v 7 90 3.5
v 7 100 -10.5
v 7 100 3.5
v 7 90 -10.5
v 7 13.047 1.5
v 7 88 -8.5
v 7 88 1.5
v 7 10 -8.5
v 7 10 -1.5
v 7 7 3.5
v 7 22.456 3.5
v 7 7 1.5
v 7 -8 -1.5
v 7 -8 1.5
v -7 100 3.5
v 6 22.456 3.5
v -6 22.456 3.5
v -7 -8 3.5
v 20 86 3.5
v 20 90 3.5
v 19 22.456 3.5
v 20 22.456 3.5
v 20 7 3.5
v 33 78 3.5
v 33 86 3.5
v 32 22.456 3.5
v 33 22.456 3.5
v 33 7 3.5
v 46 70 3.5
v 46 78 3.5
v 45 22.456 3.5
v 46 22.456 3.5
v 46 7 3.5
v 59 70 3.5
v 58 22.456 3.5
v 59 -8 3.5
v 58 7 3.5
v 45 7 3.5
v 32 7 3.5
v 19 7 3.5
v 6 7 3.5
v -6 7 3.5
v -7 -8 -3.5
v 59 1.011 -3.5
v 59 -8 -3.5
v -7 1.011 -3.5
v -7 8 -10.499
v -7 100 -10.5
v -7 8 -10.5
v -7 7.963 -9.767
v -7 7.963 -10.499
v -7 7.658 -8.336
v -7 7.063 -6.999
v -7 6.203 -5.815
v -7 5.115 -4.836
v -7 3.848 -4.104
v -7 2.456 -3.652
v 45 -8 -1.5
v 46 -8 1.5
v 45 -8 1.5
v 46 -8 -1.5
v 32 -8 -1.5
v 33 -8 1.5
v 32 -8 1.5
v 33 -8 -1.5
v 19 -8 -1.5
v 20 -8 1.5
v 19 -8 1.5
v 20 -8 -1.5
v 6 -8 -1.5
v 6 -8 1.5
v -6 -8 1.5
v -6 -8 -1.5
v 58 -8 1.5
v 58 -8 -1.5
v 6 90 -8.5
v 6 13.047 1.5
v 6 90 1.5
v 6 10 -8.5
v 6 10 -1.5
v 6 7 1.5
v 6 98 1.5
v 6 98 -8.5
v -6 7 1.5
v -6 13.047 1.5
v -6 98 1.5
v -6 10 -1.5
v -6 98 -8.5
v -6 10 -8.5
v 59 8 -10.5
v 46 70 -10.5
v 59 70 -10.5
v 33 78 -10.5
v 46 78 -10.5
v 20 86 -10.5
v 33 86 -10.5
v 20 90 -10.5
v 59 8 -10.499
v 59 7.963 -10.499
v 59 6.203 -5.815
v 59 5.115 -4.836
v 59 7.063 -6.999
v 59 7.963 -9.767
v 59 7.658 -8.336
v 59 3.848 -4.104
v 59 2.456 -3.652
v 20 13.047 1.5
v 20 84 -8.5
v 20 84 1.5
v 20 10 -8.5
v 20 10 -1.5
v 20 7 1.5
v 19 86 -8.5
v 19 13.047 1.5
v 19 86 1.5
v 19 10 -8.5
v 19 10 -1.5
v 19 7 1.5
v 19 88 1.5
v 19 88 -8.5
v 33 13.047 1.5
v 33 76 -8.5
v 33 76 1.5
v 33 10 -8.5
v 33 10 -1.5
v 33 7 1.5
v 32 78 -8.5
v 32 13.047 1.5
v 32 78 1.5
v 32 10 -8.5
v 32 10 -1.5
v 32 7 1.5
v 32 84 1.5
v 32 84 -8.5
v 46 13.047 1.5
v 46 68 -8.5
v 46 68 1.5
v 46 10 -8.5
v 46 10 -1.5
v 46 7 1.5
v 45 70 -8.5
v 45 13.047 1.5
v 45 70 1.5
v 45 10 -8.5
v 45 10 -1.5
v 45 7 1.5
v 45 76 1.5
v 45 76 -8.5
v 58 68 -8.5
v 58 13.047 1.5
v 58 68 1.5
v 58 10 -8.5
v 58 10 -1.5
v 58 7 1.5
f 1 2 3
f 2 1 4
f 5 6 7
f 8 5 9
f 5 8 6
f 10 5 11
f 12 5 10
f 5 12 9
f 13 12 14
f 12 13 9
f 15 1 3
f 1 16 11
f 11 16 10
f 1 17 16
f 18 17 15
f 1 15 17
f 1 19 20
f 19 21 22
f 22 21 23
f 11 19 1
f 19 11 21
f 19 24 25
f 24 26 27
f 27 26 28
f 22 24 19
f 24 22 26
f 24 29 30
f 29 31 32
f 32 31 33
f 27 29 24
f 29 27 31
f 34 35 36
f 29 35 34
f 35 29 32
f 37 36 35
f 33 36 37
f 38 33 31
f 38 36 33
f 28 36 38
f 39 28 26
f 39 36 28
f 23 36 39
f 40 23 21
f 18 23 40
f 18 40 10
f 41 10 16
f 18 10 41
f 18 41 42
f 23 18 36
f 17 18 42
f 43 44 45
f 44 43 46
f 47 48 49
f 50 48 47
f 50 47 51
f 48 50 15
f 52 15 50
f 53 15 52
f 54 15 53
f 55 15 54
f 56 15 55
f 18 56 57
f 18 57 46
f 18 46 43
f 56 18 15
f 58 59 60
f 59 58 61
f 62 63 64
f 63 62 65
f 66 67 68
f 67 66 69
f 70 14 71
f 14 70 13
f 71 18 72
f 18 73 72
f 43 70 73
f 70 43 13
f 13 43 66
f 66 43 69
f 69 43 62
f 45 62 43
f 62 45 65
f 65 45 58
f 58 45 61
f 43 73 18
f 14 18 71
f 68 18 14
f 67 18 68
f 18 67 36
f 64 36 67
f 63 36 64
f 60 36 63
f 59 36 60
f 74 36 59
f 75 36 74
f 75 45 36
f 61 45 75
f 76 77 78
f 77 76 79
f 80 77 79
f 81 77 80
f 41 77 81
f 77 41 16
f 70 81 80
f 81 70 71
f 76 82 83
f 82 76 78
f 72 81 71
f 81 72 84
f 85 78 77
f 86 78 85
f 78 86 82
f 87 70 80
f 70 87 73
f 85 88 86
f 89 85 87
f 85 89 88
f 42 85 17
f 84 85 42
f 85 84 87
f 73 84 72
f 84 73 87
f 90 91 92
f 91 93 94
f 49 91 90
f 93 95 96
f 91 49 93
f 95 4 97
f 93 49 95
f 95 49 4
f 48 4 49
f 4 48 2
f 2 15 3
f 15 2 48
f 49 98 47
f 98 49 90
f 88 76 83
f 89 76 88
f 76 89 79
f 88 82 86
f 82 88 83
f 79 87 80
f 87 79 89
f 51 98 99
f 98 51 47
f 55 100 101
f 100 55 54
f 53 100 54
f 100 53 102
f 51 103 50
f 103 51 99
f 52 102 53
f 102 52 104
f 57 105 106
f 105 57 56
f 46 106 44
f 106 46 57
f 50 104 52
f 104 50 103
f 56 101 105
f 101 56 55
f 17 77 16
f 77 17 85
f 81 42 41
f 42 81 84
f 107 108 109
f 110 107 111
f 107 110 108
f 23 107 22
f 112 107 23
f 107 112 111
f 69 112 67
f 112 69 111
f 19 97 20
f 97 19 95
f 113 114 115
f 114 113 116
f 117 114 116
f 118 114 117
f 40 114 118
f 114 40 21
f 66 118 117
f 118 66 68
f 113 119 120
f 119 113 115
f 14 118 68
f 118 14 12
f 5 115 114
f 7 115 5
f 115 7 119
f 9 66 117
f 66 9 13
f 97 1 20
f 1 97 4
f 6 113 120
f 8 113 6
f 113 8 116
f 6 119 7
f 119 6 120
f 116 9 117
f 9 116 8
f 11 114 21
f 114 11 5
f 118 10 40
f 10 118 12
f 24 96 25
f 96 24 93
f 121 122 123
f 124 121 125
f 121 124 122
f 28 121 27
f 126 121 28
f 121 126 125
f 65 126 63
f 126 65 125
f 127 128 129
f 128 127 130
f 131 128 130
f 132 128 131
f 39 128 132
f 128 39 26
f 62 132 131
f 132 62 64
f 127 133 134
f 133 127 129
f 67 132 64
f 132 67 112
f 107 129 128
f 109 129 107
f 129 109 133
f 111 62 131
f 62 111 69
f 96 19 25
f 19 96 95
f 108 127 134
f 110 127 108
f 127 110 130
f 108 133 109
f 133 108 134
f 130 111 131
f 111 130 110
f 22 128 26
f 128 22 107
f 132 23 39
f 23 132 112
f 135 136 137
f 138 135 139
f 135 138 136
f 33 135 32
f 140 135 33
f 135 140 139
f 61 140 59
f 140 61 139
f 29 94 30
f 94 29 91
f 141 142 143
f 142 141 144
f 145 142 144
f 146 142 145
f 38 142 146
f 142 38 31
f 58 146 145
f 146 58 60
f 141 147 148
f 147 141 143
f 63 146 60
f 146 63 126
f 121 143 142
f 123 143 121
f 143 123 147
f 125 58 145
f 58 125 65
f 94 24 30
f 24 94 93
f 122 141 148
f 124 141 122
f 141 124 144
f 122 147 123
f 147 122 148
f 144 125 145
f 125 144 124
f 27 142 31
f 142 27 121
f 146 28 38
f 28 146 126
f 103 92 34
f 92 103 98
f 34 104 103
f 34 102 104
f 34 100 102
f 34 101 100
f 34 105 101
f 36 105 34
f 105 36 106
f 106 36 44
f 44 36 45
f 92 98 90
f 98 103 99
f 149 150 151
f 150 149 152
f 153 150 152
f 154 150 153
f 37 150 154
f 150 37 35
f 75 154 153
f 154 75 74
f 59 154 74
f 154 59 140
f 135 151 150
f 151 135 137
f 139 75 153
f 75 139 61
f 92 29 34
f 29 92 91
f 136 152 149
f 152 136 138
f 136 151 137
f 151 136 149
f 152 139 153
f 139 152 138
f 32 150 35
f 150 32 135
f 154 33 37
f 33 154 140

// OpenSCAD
// [FL_INDEX: keywords="openscad, 3d_parametric, Customizer_Multitone_Whistle, csg_solid" | COT="Parametric OpenSCAD design from 3DCodeverse"]
// Title: Customizer Multitone Whistle

windway_width=12/1;
windway_height=3/1;
windway_length=16/1;
sidewall=1/1;
wall=2/1;
extra=1/1;
chamber_height=10/1;
chamber_width=windway_width;

ramp_angle=12/1;
opening_width=6/1;
ramp_length=(wall+extra)/tan(ramp_angle);

length_for_a4=176.4/1;


num_whistles=5; //[1:5]
length1=88;	//[30:150]
length2=78;	//[30:150]
length3=74;	//[30:150]
length4=66;	//[30:150]
length5=58;	//[30:150]


// notes=[12,14,15,17,19,20,22]; /* A5 B5 C6 D6 E6 F6 G6 */
//notes=[18,22];
//num_notes=2;


function note_to_freq(halfstep_from_a4) = 440 * pow(1.059463094359, halfstep_from_a4);

function note_to_length(halfstep_from_a4) = 440/note_to_freq(halfstep_from_a4) * length_for_a4;


whistle(length1);
if (num_whistles>1)
	translate([1*(windway_width+sidewall),0,0])
			whistle(length2);
if (num_whistles>2)
	translate([2*(windway_width+sidewall),0,0])
			whistle(length3);
if (num_whistles>3)
	translate([3*(windway_width+sidewall),0,0])
			whistle(length4);
if (num_whistles>4)
	translate([4*(windway_width+sidewall),0,0])
			whistle(length5);

module whistle(chamber_length=86) {
	difference() {
		union() {
			translate([0,wall/4,0]) difference() {
				cube([windway_width+sidewall*2,windway_length+wall/2,windway_height+wall*2], center=true);
				cube([windway_width,windway_length+wall/2+extra,windway_height], center=true);
			}
			
			translate([0,chamber_length/2+windway_length/2+wall,-chamber_height/2+windway_height/2]) { 
				difference() {
					cube([chamber_width+sidewall*2, chamber_length+wall*2, chamber_height+wall*2], center=true);
					cube([chamber_width,chamber_length,chamber_height], center=true);
					translate([0,-chamber_length/2-wall/2,chamber_height/2+wall-windway_height/2-wall])
					cube([windway_width, wall*2, windway_height], center=true);
				}
			}

			translate([0,windway_length/2-(chamber_height-windway_height)/2+0.001,-chamber_height/2-wall+0.001]) {
				difference() {
					cube([chamber_width+sidewall*2,chamber_height-windway_height,chamber_height-windway_height], center=true);
					translate([0,-(chamber_height-windway_height)/2,-(chamber_height-windway_height)/2])
						rotate([0,90,0]) 
							cylinder(r=chamber_height-windway_height, h=chamber_width+sidewall*2+1, center=true, $fn=30);
				}
			}

		}
		
		translate([-windway_width/2,windway_length/2+opening_width+wall-opening_width/2,windway_height/2-0.01])
			ramp_cutout();
	}
}

module ramp_cutout() {
		 translate([0,-opening_width,0]) rotate([0,0,90]) rotate([90,0,0]) linear_extrude(height=windway_width)
	 		polygon(points=[[0,0],[opening_width,0],[opening_width+ramp_length,wall+extra],[0,wall+extra]], paths=[[0,1,2,3,0]]);
}
